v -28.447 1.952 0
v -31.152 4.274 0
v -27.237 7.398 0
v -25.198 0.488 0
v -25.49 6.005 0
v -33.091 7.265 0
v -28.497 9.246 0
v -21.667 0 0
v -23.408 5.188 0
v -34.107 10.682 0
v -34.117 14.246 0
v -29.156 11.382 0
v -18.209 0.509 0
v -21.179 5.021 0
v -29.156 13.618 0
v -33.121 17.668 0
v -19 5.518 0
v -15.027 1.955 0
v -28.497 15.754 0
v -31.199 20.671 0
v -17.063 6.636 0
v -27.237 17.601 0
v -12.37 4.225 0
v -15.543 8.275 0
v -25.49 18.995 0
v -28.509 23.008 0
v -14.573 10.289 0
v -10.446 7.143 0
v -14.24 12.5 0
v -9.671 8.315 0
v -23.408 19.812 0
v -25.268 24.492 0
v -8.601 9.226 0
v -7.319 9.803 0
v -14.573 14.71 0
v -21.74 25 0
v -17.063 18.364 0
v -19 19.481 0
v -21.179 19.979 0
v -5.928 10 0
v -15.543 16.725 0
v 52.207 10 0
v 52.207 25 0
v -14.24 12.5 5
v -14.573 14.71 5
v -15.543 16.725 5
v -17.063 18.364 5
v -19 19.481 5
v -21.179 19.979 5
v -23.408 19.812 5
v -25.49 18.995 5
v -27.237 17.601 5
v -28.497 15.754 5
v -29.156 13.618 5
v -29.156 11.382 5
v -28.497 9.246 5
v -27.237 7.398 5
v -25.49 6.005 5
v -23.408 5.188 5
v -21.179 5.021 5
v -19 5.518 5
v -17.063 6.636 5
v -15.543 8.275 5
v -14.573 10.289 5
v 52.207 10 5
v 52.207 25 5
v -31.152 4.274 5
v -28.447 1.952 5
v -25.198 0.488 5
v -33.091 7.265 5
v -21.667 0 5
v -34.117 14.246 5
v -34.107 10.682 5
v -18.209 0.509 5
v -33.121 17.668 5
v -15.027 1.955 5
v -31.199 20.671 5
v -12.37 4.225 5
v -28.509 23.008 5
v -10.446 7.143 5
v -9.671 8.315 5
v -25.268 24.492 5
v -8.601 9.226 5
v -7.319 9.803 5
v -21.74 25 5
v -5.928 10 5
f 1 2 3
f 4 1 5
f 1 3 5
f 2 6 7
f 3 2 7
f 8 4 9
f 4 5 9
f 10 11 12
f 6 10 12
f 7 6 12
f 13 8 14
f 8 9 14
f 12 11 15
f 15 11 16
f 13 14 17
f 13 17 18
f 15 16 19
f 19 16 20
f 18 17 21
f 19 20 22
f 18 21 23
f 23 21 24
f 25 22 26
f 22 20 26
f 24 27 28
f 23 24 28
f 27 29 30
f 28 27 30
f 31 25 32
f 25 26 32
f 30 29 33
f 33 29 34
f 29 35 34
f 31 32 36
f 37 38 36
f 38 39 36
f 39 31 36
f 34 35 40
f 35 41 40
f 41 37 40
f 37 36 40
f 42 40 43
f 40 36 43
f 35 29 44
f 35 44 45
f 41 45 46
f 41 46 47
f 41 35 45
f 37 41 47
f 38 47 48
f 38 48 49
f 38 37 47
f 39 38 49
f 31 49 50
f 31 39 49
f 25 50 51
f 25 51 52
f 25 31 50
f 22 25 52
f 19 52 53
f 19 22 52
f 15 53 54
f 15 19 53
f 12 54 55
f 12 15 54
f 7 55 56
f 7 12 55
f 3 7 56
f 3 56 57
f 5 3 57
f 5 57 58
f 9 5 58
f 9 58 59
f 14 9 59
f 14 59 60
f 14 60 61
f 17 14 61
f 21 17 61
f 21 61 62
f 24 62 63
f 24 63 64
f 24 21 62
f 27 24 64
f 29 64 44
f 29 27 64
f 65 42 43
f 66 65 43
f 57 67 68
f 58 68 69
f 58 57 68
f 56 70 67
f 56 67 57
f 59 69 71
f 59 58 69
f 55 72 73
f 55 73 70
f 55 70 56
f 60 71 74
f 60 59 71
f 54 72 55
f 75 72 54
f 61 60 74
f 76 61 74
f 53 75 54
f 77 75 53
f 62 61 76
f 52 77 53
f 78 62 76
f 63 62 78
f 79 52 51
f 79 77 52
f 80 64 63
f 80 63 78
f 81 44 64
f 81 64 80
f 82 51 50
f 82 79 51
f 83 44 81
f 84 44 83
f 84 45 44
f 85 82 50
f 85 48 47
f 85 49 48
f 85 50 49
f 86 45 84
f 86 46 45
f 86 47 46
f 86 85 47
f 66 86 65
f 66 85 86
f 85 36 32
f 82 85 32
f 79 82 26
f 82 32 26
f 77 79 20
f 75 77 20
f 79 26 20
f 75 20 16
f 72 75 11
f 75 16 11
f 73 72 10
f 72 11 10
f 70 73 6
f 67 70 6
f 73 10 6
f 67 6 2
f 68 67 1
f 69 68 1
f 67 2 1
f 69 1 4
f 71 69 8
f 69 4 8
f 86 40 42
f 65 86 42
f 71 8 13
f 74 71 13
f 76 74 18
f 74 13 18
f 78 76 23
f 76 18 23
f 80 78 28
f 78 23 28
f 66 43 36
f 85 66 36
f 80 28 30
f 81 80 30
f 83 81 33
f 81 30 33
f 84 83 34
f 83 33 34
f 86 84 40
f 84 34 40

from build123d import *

# Parameters (mm, degrees)
F0_R     = 7.5
F1_DEPTH = 5


with BuildPart() as f1:
    # F0 (on Top) → F1 (new body)
    with BuildSketch(Plane.XY):
        with BuildLine():
            Line((52.206931, 24.999788), (-21.739577, 24.999788))
            ThreePointArc((-21.739577, 24.999788), (-34.239524, 12.463405), (-21.66681, 0))
            ThreePointArc((-21.66681, 0), (-15.027254, 1.954897), (-10.445656, 7.142797))
            ThreePointArc((-10.445656, 7.142797), (-8.600729, 9.225753), (-5.928088, 10))
            Line((-5.928088, 10), (52.206931, 10))
            Line((52.206931, 10), (52.206931, 24.999788))
        make_face()
        with Locations((-21.739577, 12.499788)):
            Circle(F0_R, mode=Mode.SUBTRACT)
    extrude(amount=F1_DEPTH)


solid = f1.part
